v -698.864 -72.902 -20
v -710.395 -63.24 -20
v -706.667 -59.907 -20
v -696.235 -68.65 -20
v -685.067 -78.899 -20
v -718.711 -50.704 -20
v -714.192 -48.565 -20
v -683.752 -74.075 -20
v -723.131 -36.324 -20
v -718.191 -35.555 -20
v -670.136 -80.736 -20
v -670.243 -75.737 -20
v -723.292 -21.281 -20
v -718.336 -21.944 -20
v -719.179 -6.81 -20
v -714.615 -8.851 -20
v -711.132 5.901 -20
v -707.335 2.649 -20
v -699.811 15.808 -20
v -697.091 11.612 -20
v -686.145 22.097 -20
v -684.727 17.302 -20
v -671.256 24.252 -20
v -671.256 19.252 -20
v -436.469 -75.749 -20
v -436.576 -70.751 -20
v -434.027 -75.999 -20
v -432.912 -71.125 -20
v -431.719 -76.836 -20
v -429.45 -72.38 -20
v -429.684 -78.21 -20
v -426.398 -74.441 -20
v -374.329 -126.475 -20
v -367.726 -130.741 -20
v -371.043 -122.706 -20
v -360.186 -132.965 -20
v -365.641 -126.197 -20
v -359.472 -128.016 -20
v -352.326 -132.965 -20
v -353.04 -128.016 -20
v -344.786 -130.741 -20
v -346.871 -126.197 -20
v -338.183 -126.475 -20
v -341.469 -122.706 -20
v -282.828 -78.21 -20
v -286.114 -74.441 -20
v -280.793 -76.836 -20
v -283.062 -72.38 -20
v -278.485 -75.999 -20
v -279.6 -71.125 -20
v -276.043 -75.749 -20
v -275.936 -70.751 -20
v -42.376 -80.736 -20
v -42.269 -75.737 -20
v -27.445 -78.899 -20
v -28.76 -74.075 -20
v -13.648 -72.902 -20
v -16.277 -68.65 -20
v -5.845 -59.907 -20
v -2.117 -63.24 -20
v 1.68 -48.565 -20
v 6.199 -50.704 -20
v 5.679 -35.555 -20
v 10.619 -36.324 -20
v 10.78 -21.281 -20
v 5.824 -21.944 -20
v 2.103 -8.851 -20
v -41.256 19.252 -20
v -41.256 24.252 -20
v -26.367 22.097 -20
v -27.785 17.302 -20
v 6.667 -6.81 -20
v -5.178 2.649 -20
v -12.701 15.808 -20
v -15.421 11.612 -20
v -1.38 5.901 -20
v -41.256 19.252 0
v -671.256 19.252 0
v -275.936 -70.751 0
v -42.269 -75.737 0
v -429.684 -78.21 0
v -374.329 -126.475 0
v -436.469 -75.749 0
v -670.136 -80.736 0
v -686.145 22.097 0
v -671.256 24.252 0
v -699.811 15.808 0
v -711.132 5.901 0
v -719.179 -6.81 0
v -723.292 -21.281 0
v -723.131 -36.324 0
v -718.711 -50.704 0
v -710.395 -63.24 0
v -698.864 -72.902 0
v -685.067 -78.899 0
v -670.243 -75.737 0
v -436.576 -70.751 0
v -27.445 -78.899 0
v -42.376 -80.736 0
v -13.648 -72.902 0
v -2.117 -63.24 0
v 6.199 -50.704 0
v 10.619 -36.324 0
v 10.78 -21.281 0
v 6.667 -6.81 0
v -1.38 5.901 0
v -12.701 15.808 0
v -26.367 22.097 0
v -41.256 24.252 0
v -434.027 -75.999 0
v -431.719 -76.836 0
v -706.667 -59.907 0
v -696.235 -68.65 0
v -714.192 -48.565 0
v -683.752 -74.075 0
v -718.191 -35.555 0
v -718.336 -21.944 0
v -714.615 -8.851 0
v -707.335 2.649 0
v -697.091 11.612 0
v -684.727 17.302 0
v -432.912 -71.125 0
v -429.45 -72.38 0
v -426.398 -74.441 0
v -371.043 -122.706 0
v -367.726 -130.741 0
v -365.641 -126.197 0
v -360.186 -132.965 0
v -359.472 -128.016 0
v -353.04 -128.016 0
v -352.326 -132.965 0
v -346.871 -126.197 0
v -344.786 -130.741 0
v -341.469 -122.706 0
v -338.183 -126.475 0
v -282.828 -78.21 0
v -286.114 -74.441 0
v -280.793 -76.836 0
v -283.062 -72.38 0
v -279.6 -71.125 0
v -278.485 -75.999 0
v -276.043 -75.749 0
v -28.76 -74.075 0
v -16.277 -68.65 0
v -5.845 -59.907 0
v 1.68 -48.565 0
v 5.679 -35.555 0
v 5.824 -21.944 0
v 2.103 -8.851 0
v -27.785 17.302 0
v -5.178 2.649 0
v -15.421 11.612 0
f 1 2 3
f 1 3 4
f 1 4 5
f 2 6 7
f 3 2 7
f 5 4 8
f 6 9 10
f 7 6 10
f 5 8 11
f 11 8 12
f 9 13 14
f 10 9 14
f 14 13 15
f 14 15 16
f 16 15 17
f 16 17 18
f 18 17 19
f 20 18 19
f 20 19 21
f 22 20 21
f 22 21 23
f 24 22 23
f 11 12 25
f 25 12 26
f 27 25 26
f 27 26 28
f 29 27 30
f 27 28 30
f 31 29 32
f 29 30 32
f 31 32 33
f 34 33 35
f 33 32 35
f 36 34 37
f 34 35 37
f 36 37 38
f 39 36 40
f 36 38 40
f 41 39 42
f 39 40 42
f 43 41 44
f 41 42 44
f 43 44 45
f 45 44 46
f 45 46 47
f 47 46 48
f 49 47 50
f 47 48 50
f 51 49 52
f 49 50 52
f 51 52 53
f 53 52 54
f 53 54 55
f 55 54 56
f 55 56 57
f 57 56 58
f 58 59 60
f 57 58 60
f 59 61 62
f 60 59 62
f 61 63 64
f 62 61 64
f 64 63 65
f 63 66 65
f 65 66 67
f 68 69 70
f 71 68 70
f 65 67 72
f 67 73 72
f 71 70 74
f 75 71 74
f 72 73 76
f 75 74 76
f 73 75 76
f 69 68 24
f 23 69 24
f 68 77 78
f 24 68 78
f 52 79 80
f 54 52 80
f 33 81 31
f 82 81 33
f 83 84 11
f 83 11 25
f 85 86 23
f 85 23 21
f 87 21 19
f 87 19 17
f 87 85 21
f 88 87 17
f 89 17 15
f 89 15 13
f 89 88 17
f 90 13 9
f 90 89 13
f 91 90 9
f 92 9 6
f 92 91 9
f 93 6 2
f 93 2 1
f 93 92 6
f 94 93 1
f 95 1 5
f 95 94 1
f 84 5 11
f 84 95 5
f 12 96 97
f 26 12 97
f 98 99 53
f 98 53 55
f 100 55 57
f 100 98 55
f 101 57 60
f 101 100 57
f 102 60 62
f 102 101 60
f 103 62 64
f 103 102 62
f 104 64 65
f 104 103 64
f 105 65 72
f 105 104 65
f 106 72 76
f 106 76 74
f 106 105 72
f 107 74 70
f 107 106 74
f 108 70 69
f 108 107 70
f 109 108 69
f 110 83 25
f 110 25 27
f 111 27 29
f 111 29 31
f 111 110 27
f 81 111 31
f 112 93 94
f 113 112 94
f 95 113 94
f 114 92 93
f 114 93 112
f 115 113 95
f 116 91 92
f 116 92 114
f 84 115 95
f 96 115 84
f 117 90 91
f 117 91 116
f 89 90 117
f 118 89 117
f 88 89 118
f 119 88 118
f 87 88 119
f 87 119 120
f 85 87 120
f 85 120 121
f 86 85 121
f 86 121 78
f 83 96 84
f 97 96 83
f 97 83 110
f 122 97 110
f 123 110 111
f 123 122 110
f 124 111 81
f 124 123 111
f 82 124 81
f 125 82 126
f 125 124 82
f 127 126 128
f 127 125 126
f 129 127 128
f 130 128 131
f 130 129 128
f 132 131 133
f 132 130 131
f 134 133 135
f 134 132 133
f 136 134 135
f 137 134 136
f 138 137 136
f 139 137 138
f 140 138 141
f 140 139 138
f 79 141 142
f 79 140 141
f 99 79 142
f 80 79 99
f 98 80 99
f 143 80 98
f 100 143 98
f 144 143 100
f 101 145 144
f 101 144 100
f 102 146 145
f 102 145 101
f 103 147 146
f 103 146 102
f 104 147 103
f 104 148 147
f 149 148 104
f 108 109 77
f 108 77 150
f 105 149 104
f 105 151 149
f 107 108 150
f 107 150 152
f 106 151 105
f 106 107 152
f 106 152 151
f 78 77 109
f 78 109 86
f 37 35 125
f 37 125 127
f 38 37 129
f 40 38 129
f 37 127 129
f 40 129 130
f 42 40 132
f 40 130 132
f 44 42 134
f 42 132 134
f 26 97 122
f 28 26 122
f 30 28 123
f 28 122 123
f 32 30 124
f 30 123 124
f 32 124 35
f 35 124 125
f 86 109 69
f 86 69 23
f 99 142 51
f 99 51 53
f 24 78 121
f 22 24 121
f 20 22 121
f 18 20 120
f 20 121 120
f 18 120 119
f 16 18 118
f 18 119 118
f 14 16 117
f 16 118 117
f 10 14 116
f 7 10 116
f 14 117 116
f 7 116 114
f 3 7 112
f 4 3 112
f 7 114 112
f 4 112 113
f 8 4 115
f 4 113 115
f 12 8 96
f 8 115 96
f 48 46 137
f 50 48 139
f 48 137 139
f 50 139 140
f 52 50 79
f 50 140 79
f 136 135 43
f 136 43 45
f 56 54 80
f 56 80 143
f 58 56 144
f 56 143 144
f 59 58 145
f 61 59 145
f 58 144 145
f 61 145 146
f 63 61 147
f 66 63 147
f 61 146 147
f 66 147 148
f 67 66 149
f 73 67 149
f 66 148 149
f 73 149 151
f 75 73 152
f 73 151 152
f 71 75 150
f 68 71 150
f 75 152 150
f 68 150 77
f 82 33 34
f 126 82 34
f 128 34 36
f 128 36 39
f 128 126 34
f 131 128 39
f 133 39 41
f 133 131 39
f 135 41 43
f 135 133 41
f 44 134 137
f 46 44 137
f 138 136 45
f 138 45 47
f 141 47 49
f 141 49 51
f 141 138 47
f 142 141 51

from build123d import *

# Parameters (mm, degrees)
EXTRUIR_L_MINA1_DEPTH = 20


with BuildPart() as part:
    # Croquis2 → Extruir-Lámina1 (new body)
    with BuildSketch(Plane.XY):
        with BuildLine():
            Line((-429.684186478, -78.209898266), (-374.32854171, -126.474819196))
            ThreePointArc((-374.32854171, -126.474819196), (-356.25601454, -133.247210514), (-338.183487369, -126.474819196))
            Line((-338.183487369, -126.474819196), (-282.827842602, -78.209898266))
            ThreePointArc((-282.827842602, -78.209898266), (-279.664968242, -76.346198087), (-276.042663992, -75.749486696))
            Line((-276.042663992, -75.749486696), (-42.376100513, -80.735910629))
            ThreePointArc((-42.376100513, -80.735910629), (11.241002289, -28.807937643), (-41.256010137, 24.252139416))
            Line((-41.256010137, 24.252139416), (-671.256009706, 24.252139416))
            ThreePointArc((-671.256009706, 24.252139416), (-723.753022133, -28.807937666), (-670.135919286, -80.735910628))
            Line((-670.135919286, -80.735910628), (-436.469365096, -75.749486696))
            ThreePointArc((-436.469365096, -75.749486696), (-432.847060841, -76.346198085), (-429.684186478, -78.209898266))
        make_face()
        with BuildLine():
            Line((-426.398272447, -74.441242142), (-371.042627679, -122.706163072))
            ThreePointArc((-371.042627679, -122.706163072), (-356.25601454, -128.247210514), (-341.4694014, -122.706163072))
            Line((-341.4694014, -122.706163072), (-286.113756633, -74.441242142))
            ThreePointArc((-286.113756633, -74.441242142), (-281.369445094, -71.645691873), (-275.935988718, -70.750624787))
            Line((-275.935988718, -70.750624787), (-42.269425239, -75.73704872))
            ThreePointArc((-42.269425239, -75.73704872), (6.24128682, -28.754596971), (-41.256010137, 19.252139416))
            Line((-41.256010137, 19.252139416), (-671.256009706, 19.252139416))
            ThreePointArc((-671.256009706, 19.252139416), (-718.753306663, -28.754596991), (-670.242594564, -75.737048719))
            Line((-670.242594564, -75.737048719), (-436.576040374, -70.750624787))
            ThreePointArc((-436.576040374, -70.750624787), (-431.142583991, -71.645691871), (-426.398272447, -74.441242142))
        make_face(mode=Mode.SUBTRACT)
    extrude(amount=-EXTRUIR_L_MINA1_DEPTH)


solid = part.part
